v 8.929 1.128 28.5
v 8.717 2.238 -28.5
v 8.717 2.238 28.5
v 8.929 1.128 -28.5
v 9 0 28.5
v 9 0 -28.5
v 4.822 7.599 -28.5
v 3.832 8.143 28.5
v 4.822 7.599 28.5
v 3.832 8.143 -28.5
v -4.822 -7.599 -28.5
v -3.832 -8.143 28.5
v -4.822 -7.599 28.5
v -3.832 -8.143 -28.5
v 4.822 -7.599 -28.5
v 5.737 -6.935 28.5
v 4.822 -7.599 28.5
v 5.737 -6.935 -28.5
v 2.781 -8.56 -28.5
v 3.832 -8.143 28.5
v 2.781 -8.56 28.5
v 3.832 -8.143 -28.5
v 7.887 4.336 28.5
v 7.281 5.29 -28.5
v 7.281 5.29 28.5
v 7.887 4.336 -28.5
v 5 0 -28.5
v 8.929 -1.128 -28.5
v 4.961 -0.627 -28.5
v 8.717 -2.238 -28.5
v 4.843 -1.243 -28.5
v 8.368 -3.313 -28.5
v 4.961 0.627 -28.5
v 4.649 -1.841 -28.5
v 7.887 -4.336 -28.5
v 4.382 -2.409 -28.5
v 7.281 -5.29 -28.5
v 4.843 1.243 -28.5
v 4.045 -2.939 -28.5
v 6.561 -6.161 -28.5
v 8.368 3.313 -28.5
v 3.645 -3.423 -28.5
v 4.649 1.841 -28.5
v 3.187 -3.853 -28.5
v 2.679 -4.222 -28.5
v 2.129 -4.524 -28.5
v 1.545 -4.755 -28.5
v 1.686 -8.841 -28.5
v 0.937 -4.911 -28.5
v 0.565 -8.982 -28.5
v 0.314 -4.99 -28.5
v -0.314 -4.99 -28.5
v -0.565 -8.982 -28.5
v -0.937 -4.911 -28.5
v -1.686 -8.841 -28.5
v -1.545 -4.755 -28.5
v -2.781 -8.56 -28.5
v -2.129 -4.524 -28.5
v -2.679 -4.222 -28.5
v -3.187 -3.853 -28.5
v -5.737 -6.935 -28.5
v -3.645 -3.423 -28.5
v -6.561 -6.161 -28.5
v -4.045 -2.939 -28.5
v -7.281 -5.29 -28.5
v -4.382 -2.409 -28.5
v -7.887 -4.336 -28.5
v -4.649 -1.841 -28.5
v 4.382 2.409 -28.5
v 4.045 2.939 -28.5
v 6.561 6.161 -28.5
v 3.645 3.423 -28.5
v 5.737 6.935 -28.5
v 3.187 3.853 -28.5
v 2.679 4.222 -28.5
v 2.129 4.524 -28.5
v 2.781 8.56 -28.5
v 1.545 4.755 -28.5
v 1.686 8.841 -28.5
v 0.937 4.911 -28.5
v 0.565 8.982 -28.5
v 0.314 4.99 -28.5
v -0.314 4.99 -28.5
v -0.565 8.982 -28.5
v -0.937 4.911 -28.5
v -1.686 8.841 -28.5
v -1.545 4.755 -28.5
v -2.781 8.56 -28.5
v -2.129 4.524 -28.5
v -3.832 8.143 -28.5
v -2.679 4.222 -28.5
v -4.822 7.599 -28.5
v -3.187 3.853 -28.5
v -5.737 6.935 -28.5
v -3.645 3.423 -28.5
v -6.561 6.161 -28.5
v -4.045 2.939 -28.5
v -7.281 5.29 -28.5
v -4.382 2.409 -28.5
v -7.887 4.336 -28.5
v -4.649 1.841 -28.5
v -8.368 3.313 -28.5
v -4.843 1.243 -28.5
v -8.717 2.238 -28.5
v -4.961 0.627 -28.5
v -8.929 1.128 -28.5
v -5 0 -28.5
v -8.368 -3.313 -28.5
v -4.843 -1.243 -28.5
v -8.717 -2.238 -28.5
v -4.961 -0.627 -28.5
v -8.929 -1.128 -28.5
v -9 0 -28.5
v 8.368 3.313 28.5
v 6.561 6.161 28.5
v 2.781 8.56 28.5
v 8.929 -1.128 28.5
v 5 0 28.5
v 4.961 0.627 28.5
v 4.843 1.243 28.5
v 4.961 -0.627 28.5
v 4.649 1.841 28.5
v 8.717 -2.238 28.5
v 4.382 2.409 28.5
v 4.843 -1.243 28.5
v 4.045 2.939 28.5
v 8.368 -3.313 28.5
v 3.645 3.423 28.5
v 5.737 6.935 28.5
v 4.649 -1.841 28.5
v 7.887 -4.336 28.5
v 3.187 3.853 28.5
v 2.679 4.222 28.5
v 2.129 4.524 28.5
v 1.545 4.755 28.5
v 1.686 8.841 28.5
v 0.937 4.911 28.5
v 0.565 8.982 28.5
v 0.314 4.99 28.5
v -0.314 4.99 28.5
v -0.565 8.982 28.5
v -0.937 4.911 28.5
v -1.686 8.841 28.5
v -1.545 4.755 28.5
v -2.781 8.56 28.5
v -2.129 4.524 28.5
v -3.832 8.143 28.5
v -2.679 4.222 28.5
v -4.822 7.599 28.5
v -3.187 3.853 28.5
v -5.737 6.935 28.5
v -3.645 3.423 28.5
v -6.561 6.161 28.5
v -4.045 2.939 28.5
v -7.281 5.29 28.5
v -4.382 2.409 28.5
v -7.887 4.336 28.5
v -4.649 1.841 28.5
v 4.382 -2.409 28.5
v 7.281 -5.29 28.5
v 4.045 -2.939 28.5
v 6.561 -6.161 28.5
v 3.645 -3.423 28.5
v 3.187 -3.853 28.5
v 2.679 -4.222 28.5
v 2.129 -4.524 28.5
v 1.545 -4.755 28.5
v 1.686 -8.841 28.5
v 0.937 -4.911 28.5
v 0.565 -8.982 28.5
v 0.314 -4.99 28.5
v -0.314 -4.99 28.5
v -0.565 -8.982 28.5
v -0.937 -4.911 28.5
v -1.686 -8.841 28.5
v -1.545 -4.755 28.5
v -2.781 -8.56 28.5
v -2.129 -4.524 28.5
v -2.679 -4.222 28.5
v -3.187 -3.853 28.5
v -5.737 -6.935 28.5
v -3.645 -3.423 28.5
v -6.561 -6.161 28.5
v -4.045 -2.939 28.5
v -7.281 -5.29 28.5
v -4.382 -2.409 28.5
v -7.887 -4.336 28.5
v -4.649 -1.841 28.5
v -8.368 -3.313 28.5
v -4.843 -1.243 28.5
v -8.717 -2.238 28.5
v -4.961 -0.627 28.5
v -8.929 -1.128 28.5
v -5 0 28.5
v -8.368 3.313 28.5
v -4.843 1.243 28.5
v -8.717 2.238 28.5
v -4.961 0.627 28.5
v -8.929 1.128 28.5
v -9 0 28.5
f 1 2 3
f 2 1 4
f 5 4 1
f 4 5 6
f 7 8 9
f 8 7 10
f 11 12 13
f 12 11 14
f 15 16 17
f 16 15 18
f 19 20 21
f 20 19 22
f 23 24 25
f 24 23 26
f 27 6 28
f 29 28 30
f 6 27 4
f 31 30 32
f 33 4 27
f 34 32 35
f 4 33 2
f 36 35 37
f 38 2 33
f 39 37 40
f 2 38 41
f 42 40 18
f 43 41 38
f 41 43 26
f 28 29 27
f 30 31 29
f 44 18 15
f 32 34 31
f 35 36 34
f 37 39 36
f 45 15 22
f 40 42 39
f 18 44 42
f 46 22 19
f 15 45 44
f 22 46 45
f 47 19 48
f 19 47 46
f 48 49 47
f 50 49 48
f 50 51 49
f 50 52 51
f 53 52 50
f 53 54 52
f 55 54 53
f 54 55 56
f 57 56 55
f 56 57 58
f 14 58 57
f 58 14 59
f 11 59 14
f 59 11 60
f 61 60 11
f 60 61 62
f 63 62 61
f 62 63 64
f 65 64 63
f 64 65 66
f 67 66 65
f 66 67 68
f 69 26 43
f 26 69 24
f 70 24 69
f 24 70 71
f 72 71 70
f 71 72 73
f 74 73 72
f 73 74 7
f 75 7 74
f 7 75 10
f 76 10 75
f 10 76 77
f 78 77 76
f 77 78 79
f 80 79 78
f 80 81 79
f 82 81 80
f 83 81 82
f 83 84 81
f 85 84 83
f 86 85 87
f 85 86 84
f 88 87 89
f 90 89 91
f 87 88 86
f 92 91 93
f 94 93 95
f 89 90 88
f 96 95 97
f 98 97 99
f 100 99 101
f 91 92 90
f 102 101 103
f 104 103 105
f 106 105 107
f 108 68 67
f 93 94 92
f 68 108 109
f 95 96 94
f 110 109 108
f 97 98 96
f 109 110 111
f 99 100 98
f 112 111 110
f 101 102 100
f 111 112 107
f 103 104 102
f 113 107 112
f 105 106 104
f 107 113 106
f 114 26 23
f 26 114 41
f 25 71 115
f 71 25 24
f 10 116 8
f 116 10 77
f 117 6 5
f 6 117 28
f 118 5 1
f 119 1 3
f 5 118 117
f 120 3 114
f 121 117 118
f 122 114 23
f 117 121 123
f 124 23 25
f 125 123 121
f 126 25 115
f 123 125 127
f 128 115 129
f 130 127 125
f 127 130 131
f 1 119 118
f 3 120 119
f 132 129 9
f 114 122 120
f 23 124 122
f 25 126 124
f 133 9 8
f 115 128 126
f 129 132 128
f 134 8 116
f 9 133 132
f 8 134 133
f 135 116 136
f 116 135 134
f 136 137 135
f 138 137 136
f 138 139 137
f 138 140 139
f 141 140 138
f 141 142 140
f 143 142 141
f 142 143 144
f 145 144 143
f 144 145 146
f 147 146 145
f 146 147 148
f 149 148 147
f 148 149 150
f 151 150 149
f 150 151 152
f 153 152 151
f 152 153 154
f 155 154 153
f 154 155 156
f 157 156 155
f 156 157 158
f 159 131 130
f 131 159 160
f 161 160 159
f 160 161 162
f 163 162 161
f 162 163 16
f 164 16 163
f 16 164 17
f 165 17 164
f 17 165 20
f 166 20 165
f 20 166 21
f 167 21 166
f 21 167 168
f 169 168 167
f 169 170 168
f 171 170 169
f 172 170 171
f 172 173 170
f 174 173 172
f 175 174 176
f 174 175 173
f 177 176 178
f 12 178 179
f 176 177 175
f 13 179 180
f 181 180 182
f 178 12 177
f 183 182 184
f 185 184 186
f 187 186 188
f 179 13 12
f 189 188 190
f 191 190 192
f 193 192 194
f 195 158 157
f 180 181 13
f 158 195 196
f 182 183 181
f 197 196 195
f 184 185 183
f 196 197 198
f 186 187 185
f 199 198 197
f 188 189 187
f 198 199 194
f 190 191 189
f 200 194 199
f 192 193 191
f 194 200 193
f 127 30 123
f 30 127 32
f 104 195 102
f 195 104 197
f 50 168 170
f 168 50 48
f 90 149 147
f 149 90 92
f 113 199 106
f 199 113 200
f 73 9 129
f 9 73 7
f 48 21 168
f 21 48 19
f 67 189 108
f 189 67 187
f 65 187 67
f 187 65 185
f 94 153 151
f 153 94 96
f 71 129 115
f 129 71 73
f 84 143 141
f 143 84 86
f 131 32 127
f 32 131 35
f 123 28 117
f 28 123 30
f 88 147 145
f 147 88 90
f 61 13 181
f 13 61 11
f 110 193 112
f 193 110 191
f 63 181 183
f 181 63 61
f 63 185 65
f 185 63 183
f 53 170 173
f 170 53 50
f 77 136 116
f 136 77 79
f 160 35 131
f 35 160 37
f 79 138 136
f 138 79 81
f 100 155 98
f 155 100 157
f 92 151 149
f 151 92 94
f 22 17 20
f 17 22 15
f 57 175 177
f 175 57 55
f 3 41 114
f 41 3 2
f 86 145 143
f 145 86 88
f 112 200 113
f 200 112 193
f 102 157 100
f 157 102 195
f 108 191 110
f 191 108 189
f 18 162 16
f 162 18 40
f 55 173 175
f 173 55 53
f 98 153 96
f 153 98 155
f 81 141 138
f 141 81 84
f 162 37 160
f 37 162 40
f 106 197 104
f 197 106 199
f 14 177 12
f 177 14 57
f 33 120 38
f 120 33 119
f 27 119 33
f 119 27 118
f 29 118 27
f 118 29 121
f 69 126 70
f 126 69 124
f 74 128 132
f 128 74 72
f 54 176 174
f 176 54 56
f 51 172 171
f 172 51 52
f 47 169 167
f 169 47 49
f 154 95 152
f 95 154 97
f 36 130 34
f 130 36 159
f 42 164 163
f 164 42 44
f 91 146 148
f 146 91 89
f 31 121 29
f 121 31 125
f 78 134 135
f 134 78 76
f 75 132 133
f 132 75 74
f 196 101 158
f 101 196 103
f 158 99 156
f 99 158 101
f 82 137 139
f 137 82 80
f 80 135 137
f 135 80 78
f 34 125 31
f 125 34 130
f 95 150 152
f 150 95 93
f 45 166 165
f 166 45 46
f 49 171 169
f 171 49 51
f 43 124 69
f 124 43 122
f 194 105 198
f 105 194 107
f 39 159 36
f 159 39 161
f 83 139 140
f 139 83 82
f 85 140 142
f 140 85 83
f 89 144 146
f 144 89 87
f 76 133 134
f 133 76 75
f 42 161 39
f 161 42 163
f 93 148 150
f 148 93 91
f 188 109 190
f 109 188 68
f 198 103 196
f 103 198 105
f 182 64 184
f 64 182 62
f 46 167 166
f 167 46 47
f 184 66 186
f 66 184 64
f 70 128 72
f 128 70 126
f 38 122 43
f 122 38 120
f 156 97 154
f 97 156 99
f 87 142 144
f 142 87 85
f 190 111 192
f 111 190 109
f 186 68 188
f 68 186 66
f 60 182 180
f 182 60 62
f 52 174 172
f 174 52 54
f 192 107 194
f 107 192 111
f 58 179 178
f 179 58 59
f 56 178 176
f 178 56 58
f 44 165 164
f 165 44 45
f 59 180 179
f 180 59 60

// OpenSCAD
$fn = 50;


difference() {
	union() {
		translate(v = [0, 0, -28.5000000000]) {
			cylinder(h = 57, r = 9.0000000000);
		}
	}
	union() {
		translate(v = [0, 0, -100.0000000000]) {
			cylinder(h = 200, r = 5.0000000000);
		}
	}
}
